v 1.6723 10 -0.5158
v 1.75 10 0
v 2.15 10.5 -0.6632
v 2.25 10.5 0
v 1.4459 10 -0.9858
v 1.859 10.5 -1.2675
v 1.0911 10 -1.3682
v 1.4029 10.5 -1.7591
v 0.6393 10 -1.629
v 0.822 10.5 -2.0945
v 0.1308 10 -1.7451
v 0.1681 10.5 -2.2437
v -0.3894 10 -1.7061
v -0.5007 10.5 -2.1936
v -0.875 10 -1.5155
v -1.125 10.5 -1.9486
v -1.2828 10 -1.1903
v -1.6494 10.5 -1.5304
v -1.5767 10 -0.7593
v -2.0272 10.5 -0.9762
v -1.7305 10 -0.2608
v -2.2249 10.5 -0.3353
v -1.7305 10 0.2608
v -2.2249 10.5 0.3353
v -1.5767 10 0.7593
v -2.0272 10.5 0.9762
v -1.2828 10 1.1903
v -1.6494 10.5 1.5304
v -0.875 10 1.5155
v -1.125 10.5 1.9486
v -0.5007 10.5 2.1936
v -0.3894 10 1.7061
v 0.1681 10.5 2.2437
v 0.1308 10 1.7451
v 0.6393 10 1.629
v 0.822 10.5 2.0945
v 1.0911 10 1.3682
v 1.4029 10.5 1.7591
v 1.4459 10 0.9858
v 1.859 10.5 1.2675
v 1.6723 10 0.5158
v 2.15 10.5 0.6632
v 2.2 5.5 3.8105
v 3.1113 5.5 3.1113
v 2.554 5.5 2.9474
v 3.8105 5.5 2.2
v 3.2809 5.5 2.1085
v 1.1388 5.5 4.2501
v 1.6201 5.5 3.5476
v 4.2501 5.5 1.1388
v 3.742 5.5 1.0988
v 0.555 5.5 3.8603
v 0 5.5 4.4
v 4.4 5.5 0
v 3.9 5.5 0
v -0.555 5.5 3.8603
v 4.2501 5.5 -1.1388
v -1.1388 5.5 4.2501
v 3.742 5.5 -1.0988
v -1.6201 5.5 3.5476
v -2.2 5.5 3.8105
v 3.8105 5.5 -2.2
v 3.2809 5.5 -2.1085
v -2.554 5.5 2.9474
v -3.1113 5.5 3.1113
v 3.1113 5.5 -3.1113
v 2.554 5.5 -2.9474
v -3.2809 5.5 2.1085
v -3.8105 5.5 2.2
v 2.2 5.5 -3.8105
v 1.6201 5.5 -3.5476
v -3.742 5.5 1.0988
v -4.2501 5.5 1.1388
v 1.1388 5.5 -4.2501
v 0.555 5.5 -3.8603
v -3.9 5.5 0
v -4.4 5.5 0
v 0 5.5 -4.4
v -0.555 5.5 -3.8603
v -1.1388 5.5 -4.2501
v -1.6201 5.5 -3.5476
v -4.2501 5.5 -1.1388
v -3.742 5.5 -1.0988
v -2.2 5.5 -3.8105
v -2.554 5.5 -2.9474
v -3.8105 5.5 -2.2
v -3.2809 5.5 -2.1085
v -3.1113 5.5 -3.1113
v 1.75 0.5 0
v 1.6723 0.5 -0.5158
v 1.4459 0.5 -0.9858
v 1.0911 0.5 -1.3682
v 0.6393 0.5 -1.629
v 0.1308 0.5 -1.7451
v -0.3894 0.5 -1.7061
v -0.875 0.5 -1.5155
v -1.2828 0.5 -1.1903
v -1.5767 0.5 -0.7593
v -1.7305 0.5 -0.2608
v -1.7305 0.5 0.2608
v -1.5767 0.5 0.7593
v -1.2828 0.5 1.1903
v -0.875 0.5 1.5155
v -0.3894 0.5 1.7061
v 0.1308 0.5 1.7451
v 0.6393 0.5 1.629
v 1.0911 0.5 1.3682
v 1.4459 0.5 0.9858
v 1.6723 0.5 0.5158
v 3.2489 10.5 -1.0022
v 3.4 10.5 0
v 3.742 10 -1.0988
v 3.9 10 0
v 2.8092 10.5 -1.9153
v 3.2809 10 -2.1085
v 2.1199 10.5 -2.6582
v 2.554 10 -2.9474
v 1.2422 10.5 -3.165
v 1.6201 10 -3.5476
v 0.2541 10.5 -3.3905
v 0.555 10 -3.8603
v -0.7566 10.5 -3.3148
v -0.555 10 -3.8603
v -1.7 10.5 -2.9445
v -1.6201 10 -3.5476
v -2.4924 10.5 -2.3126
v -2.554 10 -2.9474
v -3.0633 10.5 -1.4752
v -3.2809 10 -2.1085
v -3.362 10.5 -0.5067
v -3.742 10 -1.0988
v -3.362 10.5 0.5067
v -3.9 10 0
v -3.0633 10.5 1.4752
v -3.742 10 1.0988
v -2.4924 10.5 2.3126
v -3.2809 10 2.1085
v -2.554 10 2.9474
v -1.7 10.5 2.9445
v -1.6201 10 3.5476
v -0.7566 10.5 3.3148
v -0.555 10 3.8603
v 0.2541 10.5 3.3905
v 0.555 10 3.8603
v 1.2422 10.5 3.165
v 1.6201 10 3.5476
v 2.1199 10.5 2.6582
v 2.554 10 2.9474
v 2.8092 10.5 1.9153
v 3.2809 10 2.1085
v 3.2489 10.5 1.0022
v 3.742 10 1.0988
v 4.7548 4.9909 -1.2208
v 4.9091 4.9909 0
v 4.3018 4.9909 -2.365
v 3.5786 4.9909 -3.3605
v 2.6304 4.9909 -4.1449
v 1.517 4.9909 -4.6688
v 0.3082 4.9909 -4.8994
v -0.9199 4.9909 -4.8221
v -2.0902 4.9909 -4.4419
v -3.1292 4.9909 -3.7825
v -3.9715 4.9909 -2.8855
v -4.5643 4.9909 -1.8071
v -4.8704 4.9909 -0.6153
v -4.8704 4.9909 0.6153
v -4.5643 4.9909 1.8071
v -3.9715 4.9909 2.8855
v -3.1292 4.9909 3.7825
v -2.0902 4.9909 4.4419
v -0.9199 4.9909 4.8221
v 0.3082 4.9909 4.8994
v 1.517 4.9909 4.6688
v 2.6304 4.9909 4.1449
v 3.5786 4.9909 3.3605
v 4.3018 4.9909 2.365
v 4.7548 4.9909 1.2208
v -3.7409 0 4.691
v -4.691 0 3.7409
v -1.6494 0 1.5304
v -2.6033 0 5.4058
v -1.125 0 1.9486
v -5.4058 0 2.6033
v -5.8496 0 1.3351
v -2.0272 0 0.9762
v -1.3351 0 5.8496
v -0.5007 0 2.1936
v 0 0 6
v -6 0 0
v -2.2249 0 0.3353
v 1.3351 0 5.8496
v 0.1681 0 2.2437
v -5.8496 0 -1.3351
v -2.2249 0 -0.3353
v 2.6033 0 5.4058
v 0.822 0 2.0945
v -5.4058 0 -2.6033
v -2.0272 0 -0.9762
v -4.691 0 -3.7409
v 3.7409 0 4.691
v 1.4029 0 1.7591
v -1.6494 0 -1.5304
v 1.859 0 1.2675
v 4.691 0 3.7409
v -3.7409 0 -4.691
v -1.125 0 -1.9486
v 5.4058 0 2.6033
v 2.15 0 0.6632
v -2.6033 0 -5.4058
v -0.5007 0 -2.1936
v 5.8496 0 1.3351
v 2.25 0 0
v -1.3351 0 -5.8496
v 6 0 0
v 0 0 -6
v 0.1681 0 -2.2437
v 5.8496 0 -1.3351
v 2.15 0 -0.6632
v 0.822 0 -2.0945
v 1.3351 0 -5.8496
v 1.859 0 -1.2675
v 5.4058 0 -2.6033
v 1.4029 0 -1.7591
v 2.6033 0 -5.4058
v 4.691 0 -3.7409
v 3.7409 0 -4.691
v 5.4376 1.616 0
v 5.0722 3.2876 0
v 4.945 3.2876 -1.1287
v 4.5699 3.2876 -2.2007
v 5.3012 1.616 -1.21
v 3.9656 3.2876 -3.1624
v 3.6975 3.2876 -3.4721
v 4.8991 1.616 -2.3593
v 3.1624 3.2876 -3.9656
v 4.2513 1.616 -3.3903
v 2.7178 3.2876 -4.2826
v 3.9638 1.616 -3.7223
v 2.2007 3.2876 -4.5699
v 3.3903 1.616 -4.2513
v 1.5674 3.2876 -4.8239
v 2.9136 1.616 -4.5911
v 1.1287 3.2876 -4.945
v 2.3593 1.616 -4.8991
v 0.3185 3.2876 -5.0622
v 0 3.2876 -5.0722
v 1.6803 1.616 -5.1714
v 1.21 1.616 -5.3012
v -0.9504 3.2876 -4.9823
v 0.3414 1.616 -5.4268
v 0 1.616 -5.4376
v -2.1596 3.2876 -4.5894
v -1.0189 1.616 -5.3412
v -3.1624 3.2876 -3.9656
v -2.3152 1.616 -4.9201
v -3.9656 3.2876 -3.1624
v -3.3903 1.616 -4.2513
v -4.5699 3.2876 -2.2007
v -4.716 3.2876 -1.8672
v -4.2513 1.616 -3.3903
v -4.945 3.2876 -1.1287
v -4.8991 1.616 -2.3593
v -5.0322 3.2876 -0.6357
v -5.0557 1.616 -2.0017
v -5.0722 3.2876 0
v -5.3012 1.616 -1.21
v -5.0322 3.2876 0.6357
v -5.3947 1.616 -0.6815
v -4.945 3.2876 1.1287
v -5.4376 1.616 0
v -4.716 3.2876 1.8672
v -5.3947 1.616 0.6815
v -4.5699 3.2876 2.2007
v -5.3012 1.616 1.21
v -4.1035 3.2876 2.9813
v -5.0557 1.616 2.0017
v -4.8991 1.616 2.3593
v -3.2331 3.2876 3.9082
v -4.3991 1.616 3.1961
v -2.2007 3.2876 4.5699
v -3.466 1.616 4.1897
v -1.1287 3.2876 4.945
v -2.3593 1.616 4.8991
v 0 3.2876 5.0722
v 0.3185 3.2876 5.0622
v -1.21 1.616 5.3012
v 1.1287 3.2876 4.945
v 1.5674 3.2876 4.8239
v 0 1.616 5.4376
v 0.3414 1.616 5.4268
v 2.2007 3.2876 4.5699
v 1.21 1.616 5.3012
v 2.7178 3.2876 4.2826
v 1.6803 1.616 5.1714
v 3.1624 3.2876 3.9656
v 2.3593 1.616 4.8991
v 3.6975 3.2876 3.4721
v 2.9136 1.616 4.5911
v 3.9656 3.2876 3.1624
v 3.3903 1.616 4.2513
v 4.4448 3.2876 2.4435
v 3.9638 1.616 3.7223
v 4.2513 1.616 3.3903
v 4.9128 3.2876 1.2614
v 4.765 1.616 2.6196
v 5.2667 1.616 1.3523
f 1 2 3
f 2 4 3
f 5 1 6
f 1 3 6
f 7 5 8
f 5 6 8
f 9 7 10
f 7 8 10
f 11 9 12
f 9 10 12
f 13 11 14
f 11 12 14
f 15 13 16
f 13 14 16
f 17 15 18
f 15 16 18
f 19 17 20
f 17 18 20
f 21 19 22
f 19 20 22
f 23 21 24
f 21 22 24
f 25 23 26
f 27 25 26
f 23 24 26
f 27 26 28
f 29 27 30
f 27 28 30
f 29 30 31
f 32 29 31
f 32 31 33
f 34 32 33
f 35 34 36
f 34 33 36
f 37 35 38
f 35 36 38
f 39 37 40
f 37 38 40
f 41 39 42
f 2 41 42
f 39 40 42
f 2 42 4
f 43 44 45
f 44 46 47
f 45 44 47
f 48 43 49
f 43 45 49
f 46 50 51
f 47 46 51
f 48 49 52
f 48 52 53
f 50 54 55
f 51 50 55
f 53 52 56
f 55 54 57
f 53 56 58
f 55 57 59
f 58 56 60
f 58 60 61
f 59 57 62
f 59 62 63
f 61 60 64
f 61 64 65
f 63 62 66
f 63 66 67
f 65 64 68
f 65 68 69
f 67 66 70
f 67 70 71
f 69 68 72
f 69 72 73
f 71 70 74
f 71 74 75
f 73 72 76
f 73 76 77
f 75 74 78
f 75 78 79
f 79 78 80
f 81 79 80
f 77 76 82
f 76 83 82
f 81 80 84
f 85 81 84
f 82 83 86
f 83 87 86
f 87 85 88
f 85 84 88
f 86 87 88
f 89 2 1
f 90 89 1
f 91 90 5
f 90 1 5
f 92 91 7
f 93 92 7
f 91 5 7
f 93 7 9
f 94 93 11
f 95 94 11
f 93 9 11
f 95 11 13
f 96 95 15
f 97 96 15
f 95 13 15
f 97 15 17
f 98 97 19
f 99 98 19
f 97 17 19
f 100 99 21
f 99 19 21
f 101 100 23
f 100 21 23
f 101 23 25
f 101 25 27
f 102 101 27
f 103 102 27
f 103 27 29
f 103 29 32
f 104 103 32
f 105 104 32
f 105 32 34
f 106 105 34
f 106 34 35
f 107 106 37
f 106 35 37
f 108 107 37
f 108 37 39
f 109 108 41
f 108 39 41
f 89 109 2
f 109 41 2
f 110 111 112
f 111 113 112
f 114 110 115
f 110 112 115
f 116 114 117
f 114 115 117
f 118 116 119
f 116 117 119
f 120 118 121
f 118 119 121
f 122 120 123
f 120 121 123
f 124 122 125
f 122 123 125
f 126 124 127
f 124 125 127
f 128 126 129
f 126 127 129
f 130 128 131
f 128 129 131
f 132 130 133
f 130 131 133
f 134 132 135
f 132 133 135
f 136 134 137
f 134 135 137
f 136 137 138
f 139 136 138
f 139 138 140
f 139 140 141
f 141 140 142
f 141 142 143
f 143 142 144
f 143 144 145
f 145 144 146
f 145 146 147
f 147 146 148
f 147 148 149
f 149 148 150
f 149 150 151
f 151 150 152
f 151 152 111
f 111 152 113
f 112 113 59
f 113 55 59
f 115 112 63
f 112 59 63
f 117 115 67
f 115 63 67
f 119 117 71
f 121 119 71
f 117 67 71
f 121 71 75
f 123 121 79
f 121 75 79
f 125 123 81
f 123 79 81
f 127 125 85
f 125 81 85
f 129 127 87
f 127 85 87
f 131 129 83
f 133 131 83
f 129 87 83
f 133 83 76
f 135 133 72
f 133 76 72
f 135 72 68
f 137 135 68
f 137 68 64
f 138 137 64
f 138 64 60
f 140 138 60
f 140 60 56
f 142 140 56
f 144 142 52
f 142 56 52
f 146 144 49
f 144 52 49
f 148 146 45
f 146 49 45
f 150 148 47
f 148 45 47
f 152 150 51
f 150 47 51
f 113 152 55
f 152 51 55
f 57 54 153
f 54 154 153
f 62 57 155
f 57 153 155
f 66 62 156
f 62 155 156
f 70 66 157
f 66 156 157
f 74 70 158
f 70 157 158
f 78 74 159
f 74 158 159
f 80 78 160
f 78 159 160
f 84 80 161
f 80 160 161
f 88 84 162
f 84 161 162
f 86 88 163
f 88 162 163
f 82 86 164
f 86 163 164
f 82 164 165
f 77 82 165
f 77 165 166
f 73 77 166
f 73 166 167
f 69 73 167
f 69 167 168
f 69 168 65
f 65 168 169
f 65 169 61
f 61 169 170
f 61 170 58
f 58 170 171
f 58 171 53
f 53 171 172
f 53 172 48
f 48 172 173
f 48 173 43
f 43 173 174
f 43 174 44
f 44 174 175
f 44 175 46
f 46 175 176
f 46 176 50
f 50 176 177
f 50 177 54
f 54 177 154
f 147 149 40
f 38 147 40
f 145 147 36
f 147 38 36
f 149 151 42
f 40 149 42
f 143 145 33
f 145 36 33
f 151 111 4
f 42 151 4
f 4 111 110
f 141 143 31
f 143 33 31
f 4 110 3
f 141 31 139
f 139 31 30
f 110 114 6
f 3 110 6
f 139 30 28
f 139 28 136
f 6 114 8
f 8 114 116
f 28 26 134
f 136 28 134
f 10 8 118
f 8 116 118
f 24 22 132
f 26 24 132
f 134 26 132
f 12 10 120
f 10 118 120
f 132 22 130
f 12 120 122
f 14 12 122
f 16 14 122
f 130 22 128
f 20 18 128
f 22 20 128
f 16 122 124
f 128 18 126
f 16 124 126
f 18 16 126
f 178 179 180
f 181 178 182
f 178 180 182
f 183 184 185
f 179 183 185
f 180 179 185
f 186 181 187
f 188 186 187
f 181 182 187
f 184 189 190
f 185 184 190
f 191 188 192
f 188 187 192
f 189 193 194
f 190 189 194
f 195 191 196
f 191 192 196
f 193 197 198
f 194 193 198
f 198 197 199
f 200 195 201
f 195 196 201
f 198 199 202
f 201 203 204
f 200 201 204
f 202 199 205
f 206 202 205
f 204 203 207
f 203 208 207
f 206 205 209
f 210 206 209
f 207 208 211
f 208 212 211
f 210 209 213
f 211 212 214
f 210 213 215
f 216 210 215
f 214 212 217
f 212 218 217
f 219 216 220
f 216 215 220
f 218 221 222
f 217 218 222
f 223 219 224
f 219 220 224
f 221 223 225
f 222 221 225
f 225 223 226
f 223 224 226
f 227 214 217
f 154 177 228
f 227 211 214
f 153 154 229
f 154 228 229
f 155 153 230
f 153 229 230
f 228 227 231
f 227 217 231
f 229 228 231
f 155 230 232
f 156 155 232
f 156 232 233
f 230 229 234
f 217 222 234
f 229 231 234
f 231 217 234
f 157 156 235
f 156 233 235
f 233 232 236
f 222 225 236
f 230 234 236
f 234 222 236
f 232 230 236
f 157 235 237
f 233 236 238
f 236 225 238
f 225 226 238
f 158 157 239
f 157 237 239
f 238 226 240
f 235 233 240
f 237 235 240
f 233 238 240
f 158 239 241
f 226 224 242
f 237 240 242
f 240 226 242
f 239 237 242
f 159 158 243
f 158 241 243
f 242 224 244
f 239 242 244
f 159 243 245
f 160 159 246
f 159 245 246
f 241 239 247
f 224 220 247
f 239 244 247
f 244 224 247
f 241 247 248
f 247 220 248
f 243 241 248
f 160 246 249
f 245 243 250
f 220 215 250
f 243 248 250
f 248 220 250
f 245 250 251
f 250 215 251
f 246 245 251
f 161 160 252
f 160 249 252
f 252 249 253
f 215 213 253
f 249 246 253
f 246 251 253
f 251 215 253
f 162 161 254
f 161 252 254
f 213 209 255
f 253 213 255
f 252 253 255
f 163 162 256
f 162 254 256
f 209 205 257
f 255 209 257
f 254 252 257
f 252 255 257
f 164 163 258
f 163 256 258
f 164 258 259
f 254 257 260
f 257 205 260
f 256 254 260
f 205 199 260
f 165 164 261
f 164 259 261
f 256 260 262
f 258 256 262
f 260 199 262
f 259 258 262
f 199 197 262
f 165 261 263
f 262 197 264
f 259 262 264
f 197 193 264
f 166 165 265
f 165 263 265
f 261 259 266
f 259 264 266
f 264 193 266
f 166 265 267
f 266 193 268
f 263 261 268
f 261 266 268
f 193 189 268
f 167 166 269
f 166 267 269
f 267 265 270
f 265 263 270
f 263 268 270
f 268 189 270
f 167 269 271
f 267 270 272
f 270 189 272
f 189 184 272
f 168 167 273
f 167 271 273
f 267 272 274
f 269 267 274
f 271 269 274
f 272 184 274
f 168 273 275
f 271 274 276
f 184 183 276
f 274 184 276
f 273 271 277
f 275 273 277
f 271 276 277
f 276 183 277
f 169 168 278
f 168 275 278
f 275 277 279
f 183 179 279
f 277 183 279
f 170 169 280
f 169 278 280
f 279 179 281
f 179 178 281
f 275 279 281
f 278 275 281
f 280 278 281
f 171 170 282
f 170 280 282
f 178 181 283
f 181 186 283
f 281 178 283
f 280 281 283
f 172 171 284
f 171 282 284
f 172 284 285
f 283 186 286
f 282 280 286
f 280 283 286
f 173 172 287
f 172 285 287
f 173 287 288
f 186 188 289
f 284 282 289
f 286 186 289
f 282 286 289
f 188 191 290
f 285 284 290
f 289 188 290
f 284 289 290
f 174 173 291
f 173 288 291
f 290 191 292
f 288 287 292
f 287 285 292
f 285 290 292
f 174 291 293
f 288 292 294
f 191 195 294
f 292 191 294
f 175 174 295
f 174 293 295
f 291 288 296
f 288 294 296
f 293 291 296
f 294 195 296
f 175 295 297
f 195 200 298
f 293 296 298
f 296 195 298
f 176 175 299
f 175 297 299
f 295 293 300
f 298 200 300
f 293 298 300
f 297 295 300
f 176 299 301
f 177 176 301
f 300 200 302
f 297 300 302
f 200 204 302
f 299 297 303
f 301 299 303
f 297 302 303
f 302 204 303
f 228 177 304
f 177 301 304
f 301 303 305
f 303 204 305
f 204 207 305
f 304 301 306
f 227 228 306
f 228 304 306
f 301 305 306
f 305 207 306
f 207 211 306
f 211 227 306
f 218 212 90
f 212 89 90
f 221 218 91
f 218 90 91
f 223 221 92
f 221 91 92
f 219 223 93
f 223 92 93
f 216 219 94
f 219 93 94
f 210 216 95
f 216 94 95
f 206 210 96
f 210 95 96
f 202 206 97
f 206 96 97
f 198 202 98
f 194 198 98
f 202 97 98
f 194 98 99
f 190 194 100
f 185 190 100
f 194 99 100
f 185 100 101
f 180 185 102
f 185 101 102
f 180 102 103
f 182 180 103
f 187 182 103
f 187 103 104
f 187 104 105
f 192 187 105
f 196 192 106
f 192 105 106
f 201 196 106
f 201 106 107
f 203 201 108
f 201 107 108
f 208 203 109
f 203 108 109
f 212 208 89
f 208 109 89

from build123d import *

# Parameters (mm, degrees)
CHAMFER1_SIZE = 0.5


with BuildPart() as part:
    # Sketch1 → Revolve1 (revolve)
    with BuildSketch(Plane.XY):
        with BuildLine():
            Line((1.75, 0), (1.75, 10.5))
            Line((1.75, 10.5), (3.9, 10.5))
            Line((3.9, 10.5), (3.9, 5.5))
            Line((3.9, 5.5), (4.9, 5.5))
            ThreePointArc((4.9, 5.5), (5.177696338, 2.695539268), (6, 0))
            Line((6, 0), (1.75, 0))
        make_face()
    revolve(axis=Axis((0, -1052.626814563, 0), (0, 1, 0)))

    # Chamfer1
    # the kernel refuses this chamfer: 0.5 mm, written as the material it takes off along each edge
    with BuildSketch(Plane(origin=(0, 0, 0), x_dir=(1, 0, 0), z_dir=(0, 0, 1))) as chamfer1_piece_1:
        Polygon((1.75 + CHAMFER1_SIZE, 0), (1.75, CHAMFER1_SIZE), (1.75, 0), align=None)
    revolve(axis=Axis((0, 0, 0), (0, 1, 0)), mode=Mode.SUBTRACT)
    with BuildSketch(Plane(origin=(0, 10.5, 0), x_dir=(1, 0, 0), z_dir=(0, 0, 1))) as chamfer1_piece_2:
        Polygon((1.75, -CHAMFER1_SIZE), (1.75 + CHAMFER1_SIZE, 0), (1.75, 0), align=None)
    revolve(axis=Axis((0, 10.5, 0), (0, 1, 0)), mode=Mode.SUBTRACT)
    with BuildSketch(Plane(origin=(0, 10.5, 0), x_dir=(1, 0, 0), z_dir=(0, 0, 1))) as chamfer1_piece_3:
        Polygon((3.9 - CHAMFER1_SIZE, 0), (3.9, -CHAMFER1_SIZE), (3.9, 0), align=None)
    revolve(axis=Axis((0, 10.5, 0), (0, 1, 0)), mode=Mode.SUBTRACT)
    with BuildSketch(Plane(origin=(0, 5.5, 0), x_dir=(1, 0, 0), z_dir=(0, 0, 1))) as chamfer1_piece_4:
        with BuildLine():
            Line((4.9 - CHAMFER1_SIZE, 0), (4.909063924, -0.509063924))
            ThreePointArc((4.909063924, -0.509063924), (4.902396158, -0.261771596), (4.9, 0))
            Line((4.9, 0), (4.9 - CHAMFER1_SIZE, 0))
        make_face()
    revolve(axis=Axis((0, 5.5, 0), (0, 1, 0)), mode=Mode.SUBTRACT)


solid = part.part
